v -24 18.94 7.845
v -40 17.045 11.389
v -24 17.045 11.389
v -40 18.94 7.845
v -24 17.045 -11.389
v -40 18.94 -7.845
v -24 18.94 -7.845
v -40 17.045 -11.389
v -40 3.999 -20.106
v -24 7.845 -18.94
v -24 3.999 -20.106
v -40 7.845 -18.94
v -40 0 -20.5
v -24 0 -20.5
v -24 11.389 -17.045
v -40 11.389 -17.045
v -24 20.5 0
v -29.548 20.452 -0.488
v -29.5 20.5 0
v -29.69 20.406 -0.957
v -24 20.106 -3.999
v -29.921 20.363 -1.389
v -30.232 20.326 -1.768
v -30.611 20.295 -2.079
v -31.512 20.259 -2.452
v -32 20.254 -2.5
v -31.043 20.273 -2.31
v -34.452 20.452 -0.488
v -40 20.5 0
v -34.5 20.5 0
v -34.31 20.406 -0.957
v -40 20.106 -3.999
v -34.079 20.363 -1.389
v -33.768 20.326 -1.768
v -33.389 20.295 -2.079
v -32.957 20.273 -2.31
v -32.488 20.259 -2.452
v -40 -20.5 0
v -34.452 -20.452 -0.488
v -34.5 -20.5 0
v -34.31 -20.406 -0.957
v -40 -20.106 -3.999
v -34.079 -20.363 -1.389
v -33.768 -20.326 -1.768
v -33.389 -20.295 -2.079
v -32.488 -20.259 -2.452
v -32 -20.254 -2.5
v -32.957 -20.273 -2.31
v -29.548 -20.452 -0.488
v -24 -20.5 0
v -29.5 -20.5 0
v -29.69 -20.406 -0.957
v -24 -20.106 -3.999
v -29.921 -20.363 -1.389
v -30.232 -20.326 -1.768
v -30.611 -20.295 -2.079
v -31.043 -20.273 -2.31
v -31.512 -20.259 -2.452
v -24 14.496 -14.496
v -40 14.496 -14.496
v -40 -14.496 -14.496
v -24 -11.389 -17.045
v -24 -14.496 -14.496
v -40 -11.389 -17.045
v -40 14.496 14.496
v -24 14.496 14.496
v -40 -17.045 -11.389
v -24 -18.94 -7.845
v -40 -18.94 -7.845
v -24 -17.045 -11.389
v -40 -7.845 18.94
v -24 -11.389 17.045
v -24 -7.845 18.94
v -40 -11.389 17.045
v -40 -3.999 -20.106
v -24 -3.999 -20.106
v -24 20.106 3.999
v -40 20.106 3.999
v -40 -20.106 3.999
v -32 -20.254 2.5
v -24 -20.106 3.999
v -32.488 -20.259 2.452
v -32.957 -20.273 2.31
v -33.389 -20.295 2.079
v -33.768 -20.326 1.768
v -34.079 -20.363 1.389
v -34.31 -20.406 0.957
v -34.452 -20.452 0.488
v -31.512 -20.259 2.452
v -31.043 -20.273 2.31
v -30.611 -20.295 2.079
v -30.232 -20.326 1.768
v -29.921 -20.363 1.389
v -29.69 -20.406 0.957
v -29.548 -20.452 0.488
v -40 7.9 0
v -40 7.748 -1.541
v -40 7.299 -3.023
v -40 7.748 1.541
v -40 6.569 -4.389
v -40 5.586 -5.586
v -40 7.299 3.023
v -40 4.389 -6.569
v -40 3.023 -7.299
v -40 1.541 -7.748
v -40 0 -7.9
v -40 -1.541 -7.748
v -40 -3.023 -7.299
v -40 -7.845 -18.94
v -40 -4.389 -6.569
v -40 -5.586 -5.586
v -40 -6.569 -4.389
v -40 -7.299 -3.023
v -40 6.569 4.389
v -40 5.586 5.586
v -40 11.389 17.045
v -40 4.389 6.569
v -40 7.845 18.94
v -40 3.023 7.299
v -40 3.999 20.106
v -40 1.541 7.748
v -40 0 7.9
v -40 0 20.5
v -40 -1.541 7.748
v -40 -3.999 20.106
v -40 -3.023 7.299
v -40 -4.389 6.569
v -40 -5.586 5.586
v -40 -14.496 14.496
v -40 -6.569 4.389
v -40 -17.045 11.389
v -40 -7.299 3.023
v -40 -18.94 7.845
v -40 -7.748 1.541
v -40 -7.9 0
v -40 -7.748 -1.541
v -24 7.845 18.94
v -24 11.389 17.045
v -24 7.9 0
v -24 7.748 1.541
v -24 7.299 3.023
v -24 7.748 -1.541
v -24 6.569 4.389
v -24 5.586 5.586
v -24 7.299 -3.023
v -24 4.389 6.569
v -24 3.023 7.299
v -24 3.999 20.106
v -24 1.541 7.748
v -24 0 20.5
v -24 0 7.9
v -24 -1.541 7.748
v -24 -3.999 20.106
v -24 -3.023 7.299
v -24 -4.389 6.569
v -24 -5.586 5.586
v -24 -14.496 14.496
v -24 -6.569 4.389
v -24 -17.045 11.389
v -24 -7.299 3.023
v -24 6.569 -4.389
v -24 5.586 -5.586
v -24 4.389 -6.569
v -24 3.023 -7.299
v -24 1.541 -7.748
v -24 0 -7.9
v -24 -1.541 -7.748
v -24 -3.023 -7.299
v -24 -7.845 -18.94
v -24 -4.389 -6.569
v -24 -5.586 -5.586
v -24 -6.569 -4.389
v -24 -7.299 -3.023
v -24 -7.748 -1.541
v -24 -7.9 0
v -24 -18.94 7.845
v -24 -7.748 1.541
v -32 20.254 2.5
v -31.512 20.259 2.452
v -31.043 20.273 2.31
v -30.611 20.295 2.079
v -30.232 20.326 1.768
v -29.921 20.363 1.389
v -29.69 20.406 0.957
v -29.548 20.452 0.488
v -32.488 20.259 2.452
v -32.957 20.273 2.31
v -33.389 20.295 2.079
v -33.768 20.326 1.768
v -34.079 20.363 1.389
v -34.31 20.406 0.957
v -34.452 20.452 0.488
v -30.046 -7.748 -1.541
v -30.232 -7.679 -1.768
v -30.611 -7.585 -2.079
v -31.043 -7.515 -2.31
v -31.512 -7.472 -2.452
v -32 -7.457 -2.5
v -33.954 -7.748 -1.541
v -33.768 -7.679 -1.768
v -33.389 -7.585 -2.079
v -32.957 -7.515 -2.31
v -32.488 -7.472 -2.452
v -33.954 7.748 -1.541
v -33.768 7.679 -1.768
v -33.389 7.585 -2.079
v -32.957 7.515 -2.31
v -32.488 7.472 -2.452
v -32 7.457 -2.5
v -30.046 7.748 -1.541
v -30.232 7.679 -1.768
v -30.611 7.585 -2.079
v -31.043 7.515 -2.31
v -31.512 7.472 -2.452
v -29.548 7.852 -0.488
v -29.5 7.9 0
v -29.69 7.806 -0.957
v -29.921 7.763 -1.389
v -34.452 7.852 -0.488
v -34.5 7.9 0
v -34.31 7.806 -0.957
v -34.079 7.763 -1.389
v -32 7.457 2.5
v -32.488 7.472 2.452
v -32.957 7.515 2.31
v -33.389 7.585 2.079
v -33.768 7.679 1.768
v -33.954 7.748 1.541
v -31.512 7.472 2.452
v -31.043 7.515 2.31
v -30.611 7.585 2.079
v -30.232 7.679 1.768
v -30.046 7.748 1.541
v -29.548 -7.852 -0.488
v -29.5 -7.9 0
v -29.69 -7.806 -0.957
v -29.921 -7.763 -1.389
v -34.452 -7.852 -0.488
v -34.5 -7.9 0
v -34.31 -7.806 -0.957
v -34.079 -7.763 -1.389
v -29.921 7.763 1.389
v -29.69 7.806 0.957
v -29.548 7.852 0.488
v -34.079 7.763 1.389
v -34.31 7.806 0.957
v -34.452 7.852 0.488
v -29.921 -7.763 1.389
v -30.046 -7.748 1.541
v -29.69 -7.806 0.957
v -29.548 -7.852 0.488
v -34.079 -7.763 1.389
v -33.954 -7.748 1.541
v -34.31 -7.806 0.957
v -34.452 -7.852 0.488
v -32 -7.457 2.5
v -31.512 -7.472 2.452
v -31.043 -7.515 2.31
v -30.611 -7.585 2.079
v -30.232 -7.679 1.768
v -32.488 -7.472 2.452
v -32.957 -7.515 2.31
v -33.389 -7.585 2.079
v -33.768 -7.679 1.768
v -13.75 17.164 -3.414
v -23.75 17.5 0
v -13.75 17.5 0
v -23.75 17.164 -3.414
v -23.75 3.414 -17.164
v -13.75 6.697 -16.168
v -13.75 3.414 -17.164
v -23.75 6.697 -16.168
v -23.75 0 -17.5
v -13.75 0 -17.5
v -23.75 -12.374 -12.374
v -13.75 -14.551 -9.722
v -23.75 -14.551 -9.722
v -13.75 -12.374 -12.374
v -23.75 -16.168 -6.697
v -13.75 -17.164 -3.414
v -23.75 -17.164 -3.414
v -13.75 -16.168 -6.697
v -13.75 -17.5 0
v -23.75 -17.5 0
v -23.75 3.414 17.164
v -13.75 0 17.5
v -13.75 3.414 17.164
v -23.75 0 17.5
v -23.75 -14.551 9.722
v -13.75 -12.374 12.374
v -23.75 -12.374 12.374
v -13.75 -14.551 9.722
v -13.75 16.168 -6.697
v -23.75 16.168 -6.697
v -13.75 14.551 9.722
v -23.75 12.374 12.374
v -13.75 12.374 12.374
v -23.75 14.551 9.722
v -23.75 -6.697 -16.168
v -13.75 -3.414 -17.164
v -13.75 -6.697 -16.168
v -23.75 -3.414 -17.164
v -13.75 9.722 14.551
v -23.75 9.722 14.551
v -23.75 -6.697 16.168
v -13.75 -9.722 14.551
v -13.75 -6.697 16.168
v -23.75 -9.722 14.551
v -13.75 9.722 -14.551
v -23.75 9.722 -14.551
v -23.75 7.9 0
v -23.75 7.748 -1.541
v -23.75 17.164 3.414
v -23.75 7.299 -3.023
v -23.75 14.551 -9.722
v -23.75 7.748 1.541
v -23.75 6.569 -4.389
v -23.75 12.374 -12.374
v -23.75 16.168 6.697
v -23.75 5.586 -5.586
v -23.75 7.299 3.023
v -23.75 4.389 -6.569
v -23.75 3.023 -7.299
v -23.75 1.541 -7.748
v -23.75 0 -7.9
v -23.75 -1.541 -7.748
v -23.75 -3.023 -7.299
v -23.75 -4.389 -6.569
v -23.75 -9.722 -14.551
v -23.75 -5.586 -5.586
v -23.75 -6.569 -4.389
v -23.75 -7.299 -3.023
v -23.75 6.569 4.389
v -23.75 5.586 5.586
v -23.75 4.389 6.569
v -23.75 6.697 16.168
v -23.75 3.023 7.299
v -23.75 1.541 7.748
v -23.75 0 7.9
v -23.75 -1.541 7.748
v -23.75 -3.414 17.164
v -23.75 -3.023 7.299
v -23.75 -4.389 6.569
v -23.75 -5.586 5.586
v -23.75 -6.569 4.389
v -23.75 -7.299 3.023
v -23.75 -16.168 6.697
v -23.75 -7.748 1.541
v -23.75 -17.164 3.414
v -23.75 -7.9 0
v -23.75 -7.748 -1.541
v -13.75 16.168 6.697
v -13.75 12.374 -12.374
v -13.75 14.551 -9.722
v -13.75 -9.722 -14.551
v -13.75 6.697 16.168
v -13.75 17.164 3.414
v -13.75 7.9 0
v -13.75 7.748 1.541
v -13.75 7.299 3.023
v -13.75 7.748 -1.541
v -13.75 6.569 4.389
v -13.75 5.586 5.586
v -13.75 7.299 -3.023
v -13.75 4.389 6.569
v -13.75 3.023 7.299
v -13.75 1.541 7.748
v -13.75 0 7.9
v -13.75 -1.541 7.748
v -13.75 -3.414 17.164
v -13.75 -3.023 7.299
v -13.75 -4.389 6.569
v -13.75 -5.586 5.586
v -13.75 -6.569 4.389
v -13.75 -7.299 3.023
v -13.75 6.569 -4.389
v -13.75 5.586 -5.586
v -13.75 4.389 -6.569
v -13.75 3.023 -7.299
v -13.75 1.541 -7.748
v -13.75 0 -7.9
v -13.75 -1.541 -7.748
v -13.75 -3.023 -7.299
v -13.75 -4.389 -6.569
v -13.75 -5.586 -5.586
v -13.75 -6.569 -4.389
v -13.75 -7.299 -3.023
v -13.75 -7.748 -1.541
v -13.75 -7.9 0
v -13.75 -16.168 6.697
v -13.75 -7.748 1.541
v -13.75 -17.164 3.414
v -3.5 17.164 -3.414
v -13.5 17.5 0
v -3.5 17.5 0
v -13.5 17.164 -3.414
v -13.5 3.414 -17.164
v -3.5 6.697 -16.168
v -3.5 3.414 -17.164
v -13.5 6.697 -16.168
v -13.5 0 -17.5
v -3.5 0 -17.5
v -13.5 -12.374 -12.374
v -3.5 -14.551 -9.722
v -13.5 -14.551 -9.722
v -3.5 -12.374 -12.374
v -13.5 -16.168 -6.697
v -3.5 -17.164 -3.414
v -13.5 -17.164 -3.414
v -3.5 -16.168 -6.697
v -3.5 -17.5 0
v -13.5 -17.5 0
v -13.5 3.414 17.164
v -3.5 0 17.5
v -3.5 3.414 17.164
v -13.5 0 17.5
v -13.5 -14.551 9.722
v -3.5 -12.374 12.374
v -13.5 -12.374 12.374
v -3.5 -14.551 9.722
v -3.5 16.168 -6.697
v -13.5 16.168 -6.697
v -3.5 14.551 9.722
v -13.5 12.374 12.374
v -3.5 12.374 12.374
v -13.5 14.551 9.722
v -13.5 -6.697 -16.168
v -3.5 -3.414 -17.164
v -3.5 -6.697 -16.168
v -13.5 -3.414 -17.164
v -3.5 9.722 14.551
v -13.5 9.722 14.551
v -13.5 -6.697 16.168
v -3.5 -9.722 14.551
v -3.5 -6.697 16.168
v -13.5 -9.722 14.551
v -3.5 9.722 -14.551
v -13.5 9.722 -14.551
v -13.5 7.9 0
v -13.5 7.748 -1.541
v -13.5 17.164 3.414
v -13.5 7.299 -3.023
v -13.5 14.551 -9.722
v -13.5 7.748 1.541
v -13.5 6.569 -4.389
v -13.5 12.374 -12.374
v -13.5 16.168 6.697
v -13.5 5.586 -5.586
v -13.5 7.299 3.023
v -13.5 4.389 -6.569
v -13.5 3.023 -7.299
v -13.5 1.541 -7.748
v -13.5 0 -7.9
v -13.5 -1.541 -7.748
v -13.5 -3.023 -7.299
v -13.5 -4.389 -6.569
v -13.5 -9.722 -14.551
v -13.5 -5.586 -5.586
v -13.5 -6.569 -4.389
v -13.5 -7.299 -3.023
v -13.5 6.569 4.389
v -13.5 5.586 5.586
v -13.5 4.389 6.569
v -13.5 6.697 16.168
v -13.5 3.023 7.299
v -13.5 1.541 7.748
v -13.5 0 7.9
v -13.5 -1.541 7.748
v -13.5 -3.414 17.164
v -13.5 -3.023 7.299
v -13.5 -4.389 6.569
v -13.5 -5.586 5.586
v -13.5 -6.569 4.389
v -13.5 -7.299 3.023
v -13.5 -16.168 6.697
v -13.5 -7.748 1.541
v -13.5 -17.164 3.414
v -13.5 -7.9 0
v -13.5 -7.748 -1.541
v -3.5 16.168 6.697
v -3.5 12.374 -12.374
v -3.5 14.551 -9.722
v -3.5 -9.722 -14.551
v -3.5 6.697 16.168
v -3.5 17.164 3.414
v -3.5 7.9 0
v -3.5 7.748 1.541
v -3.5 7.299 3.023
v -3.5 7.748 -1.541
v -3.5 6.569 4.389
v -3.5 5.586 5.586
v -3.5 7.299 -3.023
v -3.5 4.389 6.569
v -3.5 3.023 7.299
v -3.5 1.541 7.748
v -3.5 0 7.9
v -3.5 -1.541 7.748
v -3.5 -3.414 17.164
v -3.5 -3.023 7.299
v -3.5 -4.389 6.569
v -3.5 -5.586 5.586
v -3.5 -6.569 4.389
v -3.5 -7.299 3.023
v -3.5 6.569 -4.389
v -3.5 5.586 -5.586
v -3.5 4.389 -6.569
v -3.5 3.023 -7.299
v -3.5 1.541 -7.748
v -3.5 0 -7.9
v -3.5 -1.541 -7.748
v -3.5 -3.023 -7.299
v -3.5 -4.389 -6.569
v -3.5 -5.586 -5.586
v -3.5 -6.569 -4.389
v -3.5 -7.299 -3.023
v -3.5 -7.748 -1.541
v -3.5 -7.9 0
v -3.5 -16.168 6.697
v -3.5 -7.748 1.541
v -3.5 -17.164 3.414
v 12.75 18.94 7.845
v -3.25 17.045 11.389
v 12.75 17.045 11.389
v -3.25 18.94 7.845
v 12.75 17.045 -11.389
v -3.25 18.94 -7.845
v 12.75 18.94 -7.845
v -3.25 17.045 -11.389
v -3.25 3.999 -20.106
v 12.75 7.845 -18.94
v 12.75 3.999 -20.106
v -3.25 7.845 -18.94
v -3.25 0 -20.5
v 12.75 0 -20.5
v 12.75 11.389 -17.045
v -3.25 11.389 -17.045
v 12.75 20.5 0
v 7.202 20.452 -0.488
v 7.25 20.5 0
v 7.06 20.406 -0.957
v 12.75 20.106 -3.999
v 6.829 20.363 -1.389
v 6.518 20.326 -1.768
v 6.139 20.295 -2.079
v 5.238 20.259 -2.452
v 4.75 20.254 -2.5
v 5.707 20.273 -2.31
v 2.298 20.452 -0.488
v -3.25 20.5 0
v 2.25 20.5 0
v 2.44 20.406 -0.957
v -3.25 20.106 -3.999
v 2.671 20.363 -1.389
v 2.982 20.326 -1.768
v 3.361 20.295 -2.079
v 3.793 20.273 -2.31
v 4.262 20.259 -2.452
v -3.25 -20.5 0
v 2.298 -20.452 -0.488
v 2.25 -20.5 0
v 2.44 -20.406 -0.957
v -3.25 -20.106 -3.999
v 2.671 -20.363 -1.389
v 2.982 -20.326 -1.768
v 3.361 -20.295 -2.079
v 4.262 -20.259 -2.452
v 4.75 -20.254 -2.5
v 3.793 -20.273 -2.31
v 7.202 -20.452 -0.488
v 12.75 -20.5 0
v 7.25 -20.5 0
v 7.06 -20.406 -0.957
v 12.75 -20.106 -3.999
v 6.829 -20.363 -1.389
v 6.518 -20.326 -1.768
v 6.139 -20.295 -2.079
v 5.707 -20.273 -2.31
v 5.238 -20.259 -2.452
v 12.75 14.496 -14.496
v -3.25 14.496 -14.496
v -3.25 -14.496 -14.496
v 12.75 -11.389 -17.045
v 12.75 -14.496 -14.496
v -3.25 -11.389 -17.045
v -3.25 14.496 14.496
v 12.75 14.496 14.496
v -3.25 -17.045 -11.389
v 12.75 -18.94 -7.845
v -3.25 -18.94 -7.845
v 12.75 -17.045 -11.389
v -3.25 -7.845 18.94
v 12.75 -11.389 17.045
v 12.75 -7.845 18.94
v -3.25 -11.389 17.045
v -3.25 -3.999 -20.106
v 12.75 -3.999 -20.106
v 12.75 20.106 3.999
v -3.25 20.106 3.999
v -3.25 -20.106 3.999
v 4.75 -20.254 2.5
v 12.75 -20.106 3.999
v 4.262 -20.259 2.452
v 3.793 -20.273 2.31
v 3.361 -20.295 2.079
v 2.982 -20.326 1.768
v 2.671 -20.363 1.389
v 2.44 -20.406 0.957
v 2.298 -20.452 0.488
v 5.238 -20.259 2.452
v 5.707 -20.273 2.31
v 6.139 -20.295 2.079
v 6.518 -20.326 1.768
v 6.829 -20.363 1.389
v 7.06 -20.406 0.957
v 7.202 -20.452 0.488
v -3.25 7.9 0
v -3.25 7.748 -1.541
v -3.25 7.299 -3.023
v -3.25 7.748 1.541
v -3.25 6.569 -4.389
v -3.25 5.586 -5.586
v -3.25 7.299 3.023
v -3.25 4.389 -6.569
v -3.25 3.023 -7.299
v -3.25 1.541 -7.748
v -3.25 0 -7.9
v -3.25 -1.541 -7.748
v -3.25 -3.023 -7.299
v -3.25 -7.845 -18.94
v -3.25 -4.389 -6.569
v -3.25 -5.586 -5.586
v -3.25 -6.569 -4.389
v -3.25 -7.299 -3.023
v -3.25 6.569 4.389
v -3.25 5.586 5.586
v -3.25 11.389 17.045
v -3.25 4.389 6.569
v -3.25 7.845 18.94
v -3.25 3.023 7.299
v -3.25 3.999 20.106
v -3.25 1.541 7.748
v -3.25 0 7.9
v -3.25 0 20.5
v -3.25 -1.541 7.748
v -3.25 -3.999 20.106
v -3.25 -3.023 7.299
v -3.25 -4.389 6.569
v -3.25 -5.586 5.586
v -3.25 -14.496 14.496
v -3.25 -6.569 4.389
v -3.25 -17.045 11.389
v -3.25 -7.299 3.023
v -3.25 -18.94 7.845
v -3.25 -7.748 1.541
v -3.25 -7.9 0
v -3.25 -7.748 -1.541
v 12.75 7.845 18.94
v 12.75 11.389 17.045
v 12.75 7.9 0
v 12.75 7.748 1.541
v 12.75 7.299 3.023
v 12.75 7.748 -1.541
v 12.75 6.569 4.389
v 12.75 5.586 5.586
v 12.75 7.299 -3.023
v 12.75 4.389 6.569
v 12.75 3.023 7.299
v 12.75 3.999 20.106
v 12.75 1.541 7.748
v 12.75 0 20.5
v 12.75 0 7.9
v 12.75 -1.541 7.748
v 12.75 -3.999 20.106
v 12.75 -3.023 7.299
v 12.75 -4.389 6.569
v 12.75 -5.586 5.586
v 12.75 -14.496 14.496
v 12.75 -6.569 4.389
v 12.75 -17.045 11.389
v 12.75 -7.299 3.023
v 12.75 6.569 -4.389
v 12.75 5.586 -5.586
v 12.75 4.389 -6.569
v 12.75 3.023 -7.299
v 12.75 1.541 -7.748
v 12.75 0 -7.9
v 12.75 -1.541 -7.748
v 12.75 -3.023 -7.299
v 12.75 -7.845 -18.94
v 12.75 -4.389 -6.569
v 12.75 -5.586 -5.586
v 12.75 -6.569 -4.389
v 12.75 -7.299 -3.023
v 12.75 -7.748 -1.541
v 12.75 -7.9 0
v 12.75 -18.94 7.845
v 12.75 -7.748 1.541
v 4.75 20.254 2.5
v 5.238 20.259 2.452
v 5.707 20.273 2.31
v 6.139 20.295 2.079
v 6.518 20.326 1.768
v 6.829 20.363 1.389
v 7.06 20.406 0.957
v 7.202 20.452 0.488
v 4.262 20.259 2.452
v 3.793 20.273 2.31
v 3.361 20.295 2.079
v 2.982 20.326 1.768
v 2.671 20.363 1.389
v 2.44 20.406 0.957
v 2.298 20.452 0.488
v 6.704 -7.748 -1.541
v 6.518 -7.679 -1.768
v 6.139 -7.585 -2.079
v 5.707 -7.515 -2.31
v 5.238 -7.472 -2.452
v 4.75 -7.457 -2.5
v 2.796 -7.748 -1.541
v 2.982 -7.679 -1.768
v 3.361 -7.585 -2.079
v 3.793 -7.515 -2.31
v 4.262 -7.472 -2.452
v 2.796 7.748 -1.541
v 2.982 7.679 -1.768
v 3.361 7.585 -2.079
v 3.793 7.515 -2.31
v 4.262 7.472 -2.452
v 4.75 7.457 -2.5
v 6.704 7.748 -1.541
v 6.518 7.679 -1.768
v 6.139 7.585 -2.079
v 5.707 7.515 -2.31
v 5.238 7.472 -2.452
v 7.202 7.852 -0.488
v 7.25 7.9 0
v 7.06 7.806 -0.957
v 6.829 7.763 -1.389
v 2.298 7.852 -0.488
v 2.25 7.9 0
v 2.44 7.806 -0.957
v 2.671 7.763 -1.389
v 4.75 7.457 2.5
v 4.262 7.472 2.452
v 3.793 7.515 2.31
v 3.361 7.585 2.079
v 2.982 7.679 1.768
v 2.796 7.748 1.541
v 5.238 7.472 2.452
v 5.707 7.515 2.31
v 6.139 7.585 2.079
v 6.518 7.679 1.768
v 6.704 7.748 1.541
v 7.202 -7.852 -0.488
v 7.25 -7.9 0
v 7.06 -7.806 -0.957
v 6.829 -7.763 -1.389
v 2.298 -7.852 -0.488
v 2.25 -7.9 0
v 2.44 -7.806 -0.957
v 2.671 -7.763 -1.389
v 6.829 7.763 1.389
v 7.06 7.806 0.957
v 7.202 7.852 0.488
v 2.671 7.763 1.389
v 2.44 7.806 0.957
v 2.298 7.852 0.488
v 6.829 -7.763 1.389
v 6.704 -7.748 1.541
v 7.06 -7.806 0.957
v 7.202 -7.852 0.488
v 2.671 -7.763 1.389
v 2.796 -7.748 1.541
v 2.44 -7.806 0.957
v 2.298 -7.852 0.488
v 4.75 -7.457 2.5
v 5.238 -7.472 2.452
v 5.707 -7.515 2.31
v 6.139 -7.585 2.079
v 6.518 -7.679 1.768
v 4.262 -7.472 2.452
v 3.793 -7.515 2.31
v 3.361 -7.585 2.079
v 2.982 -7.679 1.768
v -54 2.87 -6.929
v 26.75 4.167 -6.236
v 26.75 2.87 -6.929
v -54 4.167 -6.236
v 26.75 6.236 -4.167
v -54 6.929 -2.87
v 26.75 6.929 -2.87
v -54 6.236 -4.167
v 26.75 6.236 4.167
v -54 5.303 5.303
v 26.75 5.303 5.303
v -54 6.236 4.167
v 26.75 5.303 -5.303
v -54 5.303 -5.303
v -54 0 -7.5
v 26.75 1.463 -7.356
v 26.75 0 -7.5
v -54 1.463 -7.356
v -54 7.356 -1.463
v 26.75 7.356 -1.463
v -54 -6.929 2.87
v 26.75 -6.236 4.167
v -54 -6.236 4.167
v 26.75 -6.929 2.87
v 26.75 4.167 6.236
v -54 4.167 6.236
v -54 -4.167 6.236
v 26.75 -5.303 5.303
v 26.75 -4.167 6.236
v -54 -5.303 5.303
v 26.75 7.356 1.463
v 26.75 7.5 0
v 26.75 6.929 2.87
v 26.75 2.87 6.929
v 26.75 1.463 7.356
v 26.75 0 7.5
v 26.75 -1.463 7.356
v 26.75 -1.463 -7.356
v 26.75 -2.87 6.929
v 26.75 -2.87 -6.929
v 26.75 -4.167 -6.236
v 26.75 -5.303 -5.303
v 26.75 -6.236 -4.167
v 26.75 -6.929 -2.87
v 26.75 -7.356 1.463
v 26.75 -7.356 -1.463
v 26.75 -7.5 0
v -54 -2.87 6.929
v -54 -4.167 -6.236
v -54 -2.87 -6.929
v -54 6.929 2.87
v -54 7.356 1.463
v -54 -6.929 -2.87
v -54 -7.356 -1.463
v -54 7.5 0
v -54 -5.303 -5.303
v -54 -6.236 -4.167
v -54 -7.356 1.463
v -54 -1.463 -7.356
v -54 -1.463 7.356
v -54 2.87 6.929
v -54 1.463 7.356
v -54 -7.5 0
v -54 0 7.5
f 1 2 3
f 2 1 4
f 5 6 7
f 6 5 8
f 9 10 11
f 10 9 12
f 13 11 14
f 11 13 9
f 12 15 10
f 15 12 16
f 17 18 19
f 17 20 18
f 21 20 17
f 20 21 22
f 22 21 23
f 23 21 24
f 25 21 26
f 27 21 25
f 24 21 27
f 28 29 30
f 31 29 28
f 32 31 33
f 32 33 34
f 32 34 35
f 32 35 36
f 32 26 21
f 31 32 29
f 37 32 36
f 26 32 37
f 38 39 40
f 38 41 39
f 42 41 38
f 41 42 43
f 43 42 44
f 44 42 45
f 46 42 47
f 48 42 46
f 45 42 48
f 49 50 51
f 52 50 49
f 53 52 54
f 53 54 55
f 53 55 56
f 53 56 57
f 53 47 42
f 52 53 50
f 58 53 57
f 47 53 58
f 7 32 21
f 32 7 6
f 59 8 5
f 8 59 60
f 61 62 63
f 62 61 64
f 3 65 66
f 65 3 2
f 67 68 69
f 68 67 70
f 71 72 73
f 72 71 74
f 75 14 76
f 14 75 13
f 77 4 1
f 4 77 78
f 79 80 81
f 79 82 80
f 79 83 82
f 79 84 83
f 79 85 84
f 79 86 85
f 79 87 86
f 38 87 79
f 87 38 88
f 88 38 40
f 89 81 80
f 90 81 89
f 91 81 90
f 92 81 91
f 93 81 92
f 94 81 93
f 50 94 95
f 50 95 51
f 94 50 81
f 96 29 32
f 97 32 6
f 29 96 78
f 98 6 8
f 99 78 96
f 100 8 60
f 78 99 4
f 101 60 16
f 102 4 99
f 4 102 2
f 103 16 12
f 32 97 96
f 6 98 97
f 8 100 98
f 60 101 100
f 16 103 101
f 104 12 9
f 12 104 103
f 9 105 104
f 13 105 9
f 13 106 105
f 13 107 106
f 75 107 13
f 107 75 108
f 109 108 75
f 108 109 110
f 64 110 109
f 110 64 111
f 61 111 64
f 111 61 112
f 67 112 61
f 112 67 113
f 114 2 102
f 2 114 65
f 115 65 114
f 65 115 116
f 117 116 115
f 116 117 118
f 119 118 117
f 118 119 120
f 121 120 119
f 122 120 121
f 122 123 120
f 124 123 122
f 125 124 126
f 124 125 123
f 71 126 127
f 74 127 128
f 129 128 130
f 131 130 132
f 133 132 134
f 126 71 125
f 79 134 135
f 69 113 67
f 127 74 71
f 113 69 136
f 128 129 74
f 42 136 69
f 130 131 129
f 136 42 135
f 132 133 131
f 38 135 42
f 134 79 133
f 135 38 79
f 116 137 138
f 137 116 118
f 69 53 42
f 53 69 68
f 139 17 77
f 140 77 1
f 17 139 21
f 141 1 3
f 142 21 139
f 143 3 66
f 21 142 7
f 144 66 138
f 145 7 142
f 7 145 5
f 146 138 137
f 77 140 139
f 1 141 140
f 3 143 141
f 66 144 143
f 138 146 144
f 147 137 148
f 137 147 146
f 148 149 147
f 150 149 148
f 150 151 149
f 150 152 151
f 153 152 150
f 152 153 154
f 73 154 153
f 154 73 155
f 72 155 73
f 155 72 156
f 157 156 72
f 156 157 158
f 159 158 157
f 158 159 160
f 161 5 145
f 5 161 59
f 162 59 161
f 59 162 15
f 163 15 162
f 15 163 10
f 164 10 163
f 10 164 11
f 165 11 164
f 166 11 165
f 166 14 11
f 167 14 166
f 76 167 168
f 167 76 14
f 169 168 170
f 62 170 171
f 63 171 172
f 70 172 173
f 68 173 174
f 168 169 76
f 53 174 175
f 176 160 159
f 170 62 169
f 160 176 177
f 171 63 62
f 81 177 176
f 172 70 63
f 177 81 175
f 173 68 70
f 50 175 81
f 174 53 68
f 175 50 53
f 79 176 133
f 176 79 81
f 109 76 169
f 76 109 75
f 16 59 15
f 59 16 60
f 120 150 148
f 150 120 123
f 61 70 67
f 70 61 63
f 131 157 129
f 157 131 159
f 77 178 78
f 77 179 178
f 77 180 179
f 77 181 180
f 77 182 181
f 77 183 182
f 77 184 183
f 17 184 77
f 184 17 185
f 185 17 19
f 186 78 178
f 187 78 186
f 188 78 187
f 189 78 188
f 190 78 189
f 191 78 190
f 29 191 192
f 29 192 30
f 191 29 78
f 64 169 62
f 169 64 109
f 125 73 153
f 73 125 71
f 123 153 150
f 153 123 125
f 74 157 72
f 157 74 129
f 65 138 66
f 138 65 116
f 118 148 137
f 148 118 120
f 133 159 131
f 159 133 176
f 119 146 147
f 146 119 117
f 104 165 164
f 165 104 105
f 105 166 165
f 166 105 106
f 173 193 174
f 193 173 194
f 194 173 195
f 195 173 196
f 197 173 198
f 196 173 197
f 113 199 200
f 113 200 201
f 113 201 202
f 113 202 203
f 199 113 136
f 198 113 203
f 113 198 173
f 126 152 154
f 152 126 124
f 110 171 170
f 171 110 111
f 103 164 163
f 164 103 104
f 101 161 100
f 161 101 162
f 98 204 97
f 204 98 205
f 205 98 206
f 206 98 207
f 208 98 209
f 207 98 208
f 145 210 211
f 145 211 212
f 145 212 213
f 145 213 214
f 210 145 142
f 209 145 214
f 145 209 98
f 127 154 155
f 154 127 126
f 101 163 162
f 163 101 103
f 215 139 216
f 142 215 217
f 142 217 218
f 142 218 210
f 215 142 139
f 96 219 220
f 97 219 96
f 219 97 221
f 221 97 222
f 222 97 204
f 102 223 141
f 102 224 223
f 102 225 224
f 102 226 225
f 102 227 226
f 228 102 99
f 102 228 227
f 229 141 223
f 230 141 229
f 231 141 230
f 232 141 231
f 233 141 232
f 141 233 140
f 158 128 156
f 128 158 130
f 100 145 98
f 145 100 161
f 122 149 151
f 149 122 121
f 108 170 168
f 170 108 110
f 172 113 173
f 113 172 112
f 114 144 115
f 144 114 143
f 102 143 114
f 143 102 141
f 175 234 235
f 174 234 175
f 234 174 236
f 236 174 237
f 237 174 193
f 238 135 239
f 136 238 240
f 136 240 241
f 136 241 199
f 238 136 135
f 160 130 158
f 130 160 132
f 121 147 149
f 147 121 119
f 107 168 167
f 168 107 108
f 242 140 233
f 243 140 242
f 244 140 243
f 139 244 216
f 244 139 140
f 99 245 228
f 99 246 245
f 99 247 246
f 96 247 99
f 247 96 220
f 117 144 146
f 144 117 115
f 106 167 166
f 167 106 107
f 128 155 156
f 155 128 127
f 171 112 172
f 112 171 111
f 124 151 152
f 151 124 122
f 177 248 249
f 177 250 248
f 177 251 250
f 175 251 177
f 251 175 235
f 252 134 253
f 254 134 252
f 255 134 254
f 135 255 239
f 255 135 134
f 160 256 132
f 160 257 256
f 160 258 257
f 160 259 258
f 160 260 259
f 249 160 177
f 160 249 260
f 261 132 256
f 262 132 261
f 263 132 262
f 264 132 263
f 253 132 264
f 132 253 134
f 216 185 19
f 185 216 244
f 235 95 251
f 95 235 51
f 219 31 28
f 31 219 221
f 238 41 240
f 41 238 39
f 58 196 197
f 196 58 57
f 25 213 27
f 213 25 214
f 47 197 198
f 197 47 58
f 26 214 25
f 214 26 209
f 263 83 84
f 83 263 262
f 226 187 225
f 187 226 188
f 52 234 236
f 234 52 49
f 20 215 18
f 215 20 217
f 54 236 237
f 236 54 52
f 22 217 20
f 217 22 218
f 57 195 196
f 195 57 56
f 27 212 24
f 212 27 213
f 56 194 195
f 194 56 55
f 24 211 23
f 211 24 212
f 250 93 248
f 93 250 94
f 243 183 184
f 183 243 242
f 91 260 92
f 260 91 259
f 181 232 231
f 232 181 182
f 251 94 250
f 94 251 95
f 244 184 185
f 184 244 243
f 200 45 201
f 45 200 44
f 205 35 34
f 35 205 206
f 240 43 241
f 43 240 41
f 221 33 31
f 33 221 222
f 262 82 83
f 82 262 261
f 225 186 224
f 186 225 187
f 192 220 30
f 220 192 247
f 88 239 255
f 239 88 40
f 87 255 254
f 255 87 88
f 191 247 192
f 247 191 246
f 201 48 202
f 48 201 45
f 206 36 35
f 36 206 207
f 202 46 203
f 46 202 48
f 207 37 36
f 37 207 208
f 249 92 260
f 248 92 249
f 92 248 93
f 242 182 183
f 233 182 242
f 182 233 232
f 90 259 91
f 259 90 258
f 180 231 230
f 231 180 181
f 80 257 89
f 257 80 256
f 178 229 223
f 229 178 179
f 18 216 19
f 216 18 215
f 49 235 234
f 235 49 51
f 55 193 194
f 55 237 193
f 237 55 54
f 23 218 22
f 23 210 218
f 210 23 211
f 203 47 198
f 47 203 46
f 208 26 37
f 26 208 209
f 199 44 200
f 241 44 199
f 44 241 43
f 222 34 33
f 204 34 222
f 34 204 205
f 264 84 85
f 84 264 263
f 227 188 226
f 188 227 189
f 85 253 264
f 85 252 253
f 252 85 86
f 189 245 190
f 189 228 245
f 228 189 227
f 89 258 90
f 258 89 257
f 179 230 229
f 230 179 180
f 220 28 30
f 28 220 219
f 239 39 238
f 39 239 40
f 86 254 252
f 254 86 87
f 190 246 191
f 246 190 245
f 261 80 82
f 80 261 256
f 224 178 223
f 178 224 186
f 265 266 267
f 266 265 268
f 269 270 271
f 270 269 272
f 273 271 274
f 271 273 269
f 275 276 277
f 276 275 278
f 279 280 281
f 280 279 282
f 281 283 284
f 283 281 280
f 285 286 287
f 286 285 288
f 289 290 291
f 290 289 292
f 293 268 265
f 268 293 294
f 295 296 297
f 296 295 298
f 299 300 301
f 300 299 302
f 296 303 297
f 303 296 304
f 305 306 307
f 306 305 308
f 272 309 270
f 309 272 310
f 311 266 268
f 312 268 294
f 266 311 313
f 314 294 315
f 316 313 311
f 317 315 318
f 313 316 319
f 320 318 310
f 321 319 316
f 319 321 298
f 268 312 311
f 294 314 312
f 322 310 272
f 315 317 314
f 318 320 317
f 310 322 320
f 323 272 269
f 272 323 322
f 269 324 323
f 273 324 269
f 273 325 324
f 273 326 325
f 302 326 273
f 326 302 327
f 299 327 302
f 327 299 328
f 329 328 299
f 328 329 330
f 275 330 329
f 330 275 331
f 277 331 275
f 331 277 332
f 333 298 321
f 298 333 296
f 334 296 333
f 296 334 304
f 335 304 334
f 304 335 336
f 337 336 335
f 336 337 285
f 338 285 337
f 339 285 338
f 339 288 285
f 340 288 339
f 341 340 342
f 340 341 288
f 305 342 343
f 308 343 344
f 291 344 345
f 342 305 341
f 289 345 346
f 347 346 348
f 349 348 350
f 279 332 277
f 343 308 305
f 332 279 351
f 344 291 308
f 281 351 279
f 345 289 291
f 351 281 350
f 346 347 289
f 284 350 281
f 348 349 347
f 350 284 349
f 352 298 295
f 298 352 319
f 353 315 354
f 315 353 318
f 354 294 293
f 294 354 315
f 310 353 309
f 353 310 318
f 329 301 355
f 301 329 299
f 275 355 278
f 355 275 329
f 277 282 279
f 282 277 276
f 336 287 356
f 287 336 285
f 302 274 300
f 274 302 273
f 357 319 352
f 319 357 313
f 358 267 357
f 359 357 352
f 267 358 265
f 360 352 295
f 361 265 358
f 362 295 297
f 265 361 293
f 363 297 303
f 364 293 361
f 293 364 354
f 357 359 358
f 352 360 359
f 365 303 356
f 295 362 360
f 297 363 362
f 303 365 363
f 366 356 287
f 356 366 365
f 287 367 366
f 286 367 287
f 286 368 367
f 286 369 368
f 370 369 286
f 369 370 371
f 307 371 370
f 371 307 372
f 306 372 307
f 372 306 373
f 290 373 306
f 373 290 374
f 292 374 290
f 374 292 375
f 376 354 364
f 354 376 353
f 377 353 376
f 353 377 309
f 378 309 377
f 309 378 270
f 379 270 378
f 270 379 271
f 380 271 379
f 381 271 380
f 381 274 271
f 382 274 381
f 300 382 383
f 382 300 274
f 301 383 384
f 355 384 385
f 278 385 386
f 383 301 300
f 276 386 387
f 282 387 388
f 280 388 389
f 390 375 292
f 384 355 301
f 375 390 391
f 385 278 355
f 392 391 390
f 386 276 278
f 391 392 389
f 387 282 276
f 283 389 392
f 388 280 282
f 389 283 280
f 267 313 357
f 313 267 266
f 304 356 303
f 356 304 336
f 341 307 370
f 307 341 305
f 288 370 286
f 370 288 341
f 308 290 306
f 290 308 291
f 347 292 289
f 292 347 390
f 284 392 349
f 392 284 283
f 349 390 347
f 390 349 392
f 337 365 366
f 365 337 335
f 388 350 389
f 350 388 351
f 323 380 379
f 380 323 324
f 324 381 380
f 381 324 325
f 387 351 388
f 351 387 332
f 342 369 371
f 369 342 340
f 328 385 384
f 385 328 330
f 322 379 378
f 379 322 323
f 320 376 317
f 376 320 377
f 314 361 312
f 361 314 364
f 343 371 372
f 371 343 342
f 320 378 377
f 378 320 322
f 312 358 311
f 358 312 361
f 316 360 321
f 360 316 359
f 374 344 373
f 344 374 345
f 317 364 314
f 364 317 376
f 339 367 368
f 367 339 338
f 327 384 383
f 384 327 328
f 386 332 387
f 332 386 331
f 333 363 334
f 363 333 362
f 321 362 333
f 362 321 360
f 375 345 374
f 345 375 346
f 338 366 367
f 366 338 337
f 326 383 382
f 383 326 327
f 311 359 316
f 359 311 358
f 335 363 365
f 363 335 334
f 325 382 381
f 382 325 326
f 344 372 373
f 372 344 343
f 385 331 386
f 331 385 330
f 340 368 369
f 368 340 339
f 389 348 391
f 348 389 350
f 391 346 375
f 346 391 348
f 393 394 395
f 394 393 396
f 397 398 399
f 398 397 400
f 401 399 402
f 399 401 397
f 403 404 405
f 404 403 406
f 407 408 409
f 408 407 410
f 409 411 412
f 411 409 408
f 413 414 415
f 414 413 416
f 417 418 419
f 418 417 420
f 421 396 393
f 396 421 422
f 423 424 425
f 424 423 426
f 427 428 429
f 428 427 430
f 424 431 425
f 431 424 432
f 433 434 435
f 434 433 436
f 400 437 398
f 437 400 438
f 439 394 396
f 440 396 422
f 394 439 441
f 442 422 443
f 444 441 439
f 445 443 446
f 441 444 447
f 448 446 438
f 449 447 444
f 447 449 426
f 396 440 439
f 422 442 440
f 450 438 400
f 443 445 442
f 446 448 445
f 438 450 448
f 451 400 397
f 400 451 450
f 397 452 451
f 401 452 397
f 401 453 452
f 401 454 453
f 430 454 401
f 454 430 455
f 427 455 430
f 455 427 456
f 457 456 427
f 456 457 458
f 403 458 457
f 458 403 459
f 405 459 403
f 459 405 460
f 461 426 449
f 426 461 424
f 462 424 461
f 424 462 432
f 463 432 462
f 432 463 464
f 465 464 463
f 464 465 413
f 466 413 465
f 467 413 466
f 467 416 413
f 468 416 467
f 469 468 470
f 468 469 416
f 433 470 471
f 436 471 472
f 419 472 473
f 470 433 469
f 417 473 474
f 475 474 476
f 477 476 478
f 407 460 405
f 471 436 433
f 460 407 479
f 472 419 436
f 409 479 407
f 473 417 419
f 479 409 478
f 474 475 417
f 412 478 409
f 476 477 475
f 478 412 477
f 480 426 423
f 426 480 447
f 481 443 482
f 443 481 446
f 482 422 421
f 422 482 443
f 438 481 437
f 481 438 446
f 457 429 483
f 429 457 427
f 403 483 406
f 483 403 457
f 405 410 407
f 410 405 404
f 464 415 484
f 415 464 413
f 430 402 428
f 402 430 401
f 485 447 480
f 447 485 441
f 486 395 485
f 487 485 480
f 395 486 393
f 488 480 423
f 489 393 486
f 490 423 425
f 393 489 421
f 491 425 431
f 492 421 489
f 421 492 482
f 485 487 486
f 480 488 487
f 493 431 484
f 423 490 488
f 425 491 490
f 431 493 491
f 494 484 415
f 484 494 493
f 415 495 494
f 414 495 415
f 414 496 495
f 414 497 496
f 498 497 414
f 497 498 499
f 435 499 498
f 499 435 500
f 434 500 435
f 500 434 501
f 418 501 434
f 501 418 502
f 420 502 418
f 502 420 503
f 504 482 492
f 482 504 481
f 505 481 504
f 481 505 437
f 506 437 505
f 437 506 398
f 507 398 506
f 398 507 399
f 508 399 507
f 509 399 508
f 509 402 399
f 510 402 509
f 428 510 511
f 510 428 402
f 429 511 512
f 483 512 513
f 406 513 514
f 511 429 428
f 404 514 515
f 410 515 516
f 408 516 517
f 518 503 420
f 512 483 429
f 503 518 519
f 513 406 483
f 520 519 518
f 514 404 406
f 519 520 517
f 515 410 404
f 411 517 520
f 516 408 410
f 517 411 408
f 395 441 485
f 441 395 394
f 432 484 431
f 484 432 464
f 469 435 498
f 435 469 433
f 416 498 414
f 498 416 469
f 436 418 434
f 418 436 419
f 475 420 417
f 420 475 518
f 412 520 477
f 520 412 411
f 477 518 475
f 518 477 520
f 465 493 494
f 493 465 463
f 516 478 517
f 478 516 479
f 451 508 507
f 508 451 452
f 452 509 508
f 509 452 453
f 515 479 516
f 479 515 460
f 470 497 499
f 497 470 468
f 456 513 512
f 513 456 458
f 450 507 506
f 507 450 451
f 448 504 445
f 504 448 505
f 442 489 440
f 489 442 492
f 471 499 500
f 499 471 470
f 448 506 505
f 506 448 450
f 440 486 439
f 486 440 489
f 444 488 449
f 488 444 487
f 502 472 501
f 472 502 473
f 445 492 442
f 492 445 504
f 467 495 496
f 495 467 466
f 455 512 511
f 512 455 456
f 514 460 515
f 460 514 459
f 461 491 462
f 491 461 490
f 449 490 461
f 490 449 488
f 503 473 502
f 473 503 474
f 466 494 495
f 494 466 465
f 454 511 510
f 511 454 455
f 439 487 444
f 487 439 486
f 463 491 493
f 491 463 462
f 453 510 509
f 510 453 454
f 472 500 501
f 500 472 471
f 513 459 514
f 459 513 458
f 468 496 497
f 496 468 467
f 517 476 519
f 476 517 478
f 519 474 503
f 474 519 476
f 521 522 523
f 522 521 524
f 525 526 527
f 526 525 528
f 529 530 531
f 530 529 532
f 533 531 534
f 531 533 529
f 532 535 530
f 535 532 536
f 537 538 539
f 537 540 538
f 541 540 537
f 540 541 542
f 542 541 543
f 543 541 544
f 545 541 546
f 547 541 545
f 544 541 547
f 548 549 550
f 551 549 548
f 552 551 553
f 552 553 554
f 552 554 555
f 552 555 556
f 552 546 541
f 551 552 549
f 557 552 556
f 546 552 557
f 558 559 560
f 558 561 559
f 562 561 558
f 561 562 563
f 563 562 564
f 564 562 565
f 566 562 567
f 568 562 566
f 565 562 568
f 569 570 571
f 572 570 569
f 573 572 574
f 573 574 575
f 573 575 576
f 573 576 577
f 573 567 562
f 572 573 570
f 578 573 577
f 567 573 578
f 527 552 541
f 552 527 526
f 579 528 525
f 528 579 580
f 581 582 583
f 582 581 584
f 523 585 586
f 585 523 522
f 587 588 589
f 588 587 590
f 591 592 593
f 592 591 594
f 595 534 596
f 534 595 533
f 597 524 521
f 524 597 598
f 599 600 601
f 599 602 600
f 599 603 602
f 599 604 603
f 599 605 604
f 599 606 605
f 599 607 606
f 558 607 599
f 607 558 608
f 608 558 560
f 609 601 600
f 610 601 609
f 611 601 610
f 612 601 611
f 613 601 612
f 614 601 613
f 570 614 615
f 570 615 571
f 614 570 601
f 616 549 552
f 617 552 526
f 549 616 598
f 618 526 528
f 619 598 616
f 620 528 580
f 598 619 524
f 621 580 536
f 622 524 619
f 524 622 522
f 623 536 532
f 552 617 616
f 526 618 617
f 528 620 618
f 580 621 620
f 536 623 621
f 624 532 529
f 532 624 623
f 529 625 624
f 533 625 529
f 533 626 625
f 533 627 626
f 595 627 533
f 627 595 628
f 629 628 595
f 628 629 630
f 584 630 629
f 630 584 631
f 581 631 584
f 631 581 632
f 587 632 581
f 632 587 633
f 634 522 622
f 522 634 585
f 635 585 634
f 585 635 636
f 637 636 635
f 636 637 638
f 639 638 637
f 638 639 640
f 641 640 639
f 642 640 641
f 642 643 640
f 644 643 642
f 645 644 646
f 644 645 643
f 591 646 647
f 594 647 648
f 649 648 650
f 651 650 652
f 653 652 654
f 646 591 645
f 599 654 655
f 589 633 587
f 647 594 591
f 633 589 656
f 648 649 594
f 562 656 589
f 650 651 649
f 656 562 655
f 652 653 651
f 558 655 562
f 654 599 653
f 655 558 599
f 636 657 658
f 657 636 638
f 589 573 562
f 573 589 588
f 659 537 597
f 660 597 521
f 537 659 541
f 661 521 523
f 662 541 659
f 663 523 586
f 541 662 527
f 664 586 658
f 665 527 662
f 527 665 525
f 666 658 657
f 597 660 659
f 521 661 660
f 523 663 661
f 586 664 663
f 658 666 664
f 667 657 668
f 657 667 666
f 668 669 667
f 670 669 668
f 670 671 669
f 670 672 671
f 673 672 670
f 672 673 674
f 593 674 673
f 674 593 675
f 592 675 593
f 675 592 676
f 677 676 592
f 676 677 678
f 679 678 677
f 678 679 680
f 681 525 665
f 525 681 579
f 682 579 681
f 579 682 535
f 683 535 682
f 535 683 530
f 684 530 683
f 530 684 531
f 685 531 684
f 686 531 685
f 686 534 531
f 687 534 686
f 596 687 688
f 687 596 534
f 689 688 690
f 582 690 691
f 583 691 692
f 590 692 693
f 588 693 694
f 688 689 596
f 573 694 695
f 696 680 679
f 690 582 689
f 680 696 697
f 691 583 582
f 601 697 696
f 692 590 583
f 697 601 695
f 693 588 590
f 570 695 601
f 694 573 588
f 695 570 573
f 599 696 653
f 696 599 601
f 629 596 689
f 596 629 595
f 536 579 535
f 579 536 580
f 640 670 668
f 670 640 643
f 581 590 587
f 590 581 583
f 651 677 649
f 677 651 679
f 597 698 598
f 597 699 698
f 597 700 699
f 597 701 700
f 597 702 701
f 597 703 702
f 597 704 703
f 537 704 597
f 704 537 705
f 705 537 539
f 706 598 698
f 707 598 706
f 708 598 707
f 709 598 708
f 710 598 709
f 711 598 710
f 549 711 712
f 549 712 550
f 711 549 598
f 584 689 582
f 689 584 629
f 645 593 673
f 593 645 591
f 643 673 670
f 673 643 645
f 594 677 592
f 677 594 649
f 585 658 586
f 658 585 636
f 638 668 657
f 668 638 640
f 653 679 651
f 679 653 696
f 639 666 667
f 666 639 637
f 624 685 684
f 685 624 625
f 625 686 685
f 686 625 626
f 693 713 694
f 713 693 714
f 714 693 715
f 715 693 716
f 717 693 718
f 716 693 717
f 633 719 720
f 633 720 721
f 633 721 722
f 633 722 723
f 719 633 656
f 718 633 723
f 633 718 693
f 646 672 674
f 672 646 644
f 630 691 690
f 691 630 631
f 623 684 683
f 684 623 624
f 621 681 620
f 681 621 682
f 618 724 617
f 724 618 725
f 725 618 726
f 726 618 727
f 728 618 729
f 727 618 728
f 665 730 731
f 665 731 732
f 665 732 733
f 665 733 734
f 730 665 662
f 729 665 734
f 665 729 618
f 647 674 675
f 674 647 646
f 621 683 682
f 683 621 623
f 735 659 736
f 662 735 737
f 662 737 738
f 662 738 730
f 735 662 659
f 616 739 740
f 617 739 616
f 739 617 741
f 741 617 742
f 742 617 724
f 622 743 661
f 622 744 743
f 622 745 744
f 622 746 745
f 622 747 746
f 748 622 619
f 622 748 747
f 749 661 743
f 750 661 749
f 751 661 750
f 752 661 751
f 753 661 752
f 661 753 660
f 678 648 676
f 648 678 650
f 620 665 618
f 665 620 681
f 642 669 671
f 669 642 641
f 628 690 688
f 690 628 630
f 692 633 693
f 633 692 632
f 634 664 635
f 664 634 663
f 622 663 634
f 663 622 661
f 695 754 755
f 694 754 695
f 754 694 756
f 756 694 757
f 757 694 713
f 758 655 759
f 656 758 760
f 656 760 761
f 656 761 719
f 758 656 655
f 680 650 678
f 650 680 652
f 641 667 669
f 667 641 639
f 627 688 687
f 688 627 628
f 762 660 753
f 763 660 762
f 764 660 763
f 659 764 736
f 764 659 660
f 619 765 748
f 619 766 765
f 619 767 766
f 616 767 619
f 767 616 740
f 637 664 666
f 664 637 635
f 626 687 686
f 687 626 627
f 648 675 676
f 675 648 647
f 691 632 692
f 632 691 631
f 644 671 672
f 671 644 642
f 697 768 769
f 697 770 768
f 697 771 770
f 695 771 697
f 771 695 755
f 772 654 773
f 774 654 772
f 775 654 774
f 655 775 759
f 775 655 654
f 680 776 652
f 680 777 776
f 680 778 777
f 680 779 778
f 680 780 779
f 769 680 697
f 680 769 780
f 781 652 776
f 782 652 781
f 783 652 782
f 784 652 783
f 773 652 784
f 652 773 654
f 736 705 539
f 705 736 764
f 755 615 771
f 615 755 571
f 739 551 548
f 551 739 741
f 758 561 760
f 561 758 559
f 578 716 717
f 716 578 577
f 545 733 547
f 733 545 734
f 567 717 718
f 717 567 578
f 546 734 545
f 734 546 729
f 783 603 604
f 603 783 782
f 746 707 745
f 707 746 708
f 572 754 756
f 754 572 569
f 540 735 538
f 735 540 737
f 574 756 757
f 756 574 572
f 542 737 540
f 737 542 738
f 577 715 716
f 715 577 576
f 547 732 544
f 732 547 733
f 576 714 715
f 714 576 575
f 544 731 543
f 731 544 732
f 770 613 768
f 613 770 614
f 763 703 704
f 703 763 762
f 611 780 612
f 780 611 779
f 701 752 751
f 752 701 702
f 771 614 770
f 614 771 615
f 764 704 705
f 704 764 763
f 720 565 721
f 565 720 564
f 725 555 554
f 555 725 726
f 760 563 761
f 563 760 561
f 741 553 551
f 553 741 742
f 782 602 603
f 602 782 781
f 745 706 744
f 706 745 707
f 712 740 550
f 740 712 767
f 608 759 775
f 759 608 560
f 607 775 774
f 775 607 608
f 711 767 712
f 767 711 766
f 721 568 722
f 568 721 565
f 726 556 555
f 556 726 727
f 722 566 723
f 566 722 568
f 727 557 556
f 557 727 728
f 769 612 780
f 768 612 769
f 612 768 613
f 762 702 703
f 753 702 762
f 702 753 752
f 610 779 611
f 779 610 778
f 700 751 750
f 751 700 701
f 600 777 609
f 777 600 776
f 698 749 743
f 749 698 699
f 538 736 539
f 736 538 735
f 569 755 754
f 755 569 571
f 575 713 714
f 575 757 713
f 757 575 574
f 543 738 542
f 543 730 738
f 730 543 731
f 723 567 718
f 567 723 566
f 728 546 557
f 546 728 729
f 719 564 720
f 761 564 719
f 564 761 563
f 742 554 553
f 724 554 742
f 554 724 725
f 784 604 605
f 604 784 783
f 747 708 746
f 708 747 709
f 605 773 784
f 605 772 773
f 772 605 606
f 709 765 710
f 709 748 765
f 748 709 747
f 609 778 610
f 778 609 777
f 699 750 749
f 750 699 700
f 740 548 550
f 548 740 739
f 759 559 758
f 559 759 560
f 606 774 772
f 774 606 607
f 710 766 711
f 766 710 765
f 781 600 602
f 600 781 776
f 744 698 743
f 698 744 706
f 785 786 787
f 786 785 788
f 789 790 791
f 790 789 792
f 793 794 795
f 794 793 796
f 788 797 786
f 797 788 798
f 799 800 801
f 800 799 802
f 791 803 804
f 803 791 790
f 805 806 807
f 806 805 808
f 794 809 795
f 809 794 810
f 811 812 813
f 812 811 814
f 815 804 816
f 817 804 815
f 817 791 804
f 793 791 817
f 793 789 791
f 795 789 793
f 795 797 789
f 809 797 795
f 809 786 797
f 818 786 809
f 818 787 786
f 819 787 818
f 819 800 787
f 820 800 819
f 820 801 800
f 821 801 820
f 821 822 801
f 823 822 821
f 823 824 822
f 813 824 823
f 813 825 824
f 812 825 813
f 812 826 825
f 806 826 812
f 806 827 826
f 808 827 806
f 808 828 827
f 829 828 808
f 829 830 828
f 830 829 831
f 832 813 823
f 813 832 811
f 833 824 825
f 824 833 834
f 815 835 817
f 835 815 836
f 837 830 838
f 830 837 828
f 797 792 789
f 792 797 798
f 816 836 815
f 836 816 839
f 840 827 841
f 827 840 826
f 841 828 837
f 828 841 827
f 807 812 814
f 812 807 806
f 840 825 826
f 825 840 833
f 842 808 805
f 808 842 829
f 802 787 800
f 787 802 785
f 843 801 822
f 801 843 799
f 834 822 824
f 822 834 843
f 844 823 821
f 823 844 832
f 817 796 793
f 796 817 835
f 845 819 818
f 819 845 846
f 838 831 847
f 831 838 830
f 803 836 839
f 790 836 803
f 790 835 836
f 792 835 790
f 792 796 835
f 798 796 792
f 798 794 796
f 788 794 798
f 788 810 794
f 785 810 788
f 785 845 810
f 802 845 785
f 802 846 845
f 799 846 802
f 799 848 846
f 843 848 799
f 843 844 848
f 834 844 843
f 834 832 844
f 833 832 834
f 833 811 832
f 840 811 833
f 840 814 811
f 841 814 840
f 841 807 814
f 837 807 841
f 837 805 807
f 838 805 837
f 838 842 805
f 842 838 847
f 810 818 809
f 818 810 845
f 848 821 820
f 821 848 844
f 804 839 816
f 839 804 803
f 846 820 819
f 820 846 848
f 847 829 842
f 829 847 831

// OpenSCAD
$fn = 32;

// ------------------------------------------------------------------------
// Shaft with rings and collars: d15 shaft, 4 rings
// Every part is its own module, assembly() places them once.
// ------------------------------------------------------------------------

// --- part 1 ---
module shaft() {
  translate([0, 0, -40.375]) cylinder(h = 80.75, d = 15);
}

// --- part 2 ---
module collar_a() {
  difference() {
    cylinder(h = 16, d = 41);
    translate([0, 0, -1]) cylinder(h = 18, d = 15.8);
    translate([0, 0, 8]) rotate([90, 0, 0]) cylinder(h = 43, d = 5, center = true);
  }
}

// --- part 3 ---
module spacer_a() {
  difference() {
      translate([0, 0, 0]) cylinder(h = 10, d = 35);
      translate([0, 0, -1]) cylinder(h = 12, d = 15.8);
    }
}

// --- part 4 ---
module spacer_b() {
  difference() {
      translate([0, 0, 0]) cylinder(h = 10, d = 35);
      translate([0, 0, -1]) cylinder(h = 12, d = 15.8);
    }
}

// --- part 5 ---
module collar_b() {
  difference() {
    cylinder(h = 16, d = 41);
    translate([0, 0, -1]) cylinder(h = 18, d = 15.8);
    translate([0, 0, 8]) rotate([90, 0, 0]) cylinder(h = 43, d = 5, center = true);
  }
}

// --- assembly ---
module assembly() {
  translate([-13.625, 0, 0]) rotate([0, 90, 0]) shaft();
  translate([-40, 0, 0]) rotate([0, 90, 0]) collar_a();
  translate([-23.75, 0, 0]) rotate([0, 90, 0]) spacer_a();
  translate([-13.5, 0, 0]) rotate([0, 90, 0]) spacer_b();
  translate([-3.25, 0, 0]) rotate([0, 90, 0]) collar_b();
}

assembly();
